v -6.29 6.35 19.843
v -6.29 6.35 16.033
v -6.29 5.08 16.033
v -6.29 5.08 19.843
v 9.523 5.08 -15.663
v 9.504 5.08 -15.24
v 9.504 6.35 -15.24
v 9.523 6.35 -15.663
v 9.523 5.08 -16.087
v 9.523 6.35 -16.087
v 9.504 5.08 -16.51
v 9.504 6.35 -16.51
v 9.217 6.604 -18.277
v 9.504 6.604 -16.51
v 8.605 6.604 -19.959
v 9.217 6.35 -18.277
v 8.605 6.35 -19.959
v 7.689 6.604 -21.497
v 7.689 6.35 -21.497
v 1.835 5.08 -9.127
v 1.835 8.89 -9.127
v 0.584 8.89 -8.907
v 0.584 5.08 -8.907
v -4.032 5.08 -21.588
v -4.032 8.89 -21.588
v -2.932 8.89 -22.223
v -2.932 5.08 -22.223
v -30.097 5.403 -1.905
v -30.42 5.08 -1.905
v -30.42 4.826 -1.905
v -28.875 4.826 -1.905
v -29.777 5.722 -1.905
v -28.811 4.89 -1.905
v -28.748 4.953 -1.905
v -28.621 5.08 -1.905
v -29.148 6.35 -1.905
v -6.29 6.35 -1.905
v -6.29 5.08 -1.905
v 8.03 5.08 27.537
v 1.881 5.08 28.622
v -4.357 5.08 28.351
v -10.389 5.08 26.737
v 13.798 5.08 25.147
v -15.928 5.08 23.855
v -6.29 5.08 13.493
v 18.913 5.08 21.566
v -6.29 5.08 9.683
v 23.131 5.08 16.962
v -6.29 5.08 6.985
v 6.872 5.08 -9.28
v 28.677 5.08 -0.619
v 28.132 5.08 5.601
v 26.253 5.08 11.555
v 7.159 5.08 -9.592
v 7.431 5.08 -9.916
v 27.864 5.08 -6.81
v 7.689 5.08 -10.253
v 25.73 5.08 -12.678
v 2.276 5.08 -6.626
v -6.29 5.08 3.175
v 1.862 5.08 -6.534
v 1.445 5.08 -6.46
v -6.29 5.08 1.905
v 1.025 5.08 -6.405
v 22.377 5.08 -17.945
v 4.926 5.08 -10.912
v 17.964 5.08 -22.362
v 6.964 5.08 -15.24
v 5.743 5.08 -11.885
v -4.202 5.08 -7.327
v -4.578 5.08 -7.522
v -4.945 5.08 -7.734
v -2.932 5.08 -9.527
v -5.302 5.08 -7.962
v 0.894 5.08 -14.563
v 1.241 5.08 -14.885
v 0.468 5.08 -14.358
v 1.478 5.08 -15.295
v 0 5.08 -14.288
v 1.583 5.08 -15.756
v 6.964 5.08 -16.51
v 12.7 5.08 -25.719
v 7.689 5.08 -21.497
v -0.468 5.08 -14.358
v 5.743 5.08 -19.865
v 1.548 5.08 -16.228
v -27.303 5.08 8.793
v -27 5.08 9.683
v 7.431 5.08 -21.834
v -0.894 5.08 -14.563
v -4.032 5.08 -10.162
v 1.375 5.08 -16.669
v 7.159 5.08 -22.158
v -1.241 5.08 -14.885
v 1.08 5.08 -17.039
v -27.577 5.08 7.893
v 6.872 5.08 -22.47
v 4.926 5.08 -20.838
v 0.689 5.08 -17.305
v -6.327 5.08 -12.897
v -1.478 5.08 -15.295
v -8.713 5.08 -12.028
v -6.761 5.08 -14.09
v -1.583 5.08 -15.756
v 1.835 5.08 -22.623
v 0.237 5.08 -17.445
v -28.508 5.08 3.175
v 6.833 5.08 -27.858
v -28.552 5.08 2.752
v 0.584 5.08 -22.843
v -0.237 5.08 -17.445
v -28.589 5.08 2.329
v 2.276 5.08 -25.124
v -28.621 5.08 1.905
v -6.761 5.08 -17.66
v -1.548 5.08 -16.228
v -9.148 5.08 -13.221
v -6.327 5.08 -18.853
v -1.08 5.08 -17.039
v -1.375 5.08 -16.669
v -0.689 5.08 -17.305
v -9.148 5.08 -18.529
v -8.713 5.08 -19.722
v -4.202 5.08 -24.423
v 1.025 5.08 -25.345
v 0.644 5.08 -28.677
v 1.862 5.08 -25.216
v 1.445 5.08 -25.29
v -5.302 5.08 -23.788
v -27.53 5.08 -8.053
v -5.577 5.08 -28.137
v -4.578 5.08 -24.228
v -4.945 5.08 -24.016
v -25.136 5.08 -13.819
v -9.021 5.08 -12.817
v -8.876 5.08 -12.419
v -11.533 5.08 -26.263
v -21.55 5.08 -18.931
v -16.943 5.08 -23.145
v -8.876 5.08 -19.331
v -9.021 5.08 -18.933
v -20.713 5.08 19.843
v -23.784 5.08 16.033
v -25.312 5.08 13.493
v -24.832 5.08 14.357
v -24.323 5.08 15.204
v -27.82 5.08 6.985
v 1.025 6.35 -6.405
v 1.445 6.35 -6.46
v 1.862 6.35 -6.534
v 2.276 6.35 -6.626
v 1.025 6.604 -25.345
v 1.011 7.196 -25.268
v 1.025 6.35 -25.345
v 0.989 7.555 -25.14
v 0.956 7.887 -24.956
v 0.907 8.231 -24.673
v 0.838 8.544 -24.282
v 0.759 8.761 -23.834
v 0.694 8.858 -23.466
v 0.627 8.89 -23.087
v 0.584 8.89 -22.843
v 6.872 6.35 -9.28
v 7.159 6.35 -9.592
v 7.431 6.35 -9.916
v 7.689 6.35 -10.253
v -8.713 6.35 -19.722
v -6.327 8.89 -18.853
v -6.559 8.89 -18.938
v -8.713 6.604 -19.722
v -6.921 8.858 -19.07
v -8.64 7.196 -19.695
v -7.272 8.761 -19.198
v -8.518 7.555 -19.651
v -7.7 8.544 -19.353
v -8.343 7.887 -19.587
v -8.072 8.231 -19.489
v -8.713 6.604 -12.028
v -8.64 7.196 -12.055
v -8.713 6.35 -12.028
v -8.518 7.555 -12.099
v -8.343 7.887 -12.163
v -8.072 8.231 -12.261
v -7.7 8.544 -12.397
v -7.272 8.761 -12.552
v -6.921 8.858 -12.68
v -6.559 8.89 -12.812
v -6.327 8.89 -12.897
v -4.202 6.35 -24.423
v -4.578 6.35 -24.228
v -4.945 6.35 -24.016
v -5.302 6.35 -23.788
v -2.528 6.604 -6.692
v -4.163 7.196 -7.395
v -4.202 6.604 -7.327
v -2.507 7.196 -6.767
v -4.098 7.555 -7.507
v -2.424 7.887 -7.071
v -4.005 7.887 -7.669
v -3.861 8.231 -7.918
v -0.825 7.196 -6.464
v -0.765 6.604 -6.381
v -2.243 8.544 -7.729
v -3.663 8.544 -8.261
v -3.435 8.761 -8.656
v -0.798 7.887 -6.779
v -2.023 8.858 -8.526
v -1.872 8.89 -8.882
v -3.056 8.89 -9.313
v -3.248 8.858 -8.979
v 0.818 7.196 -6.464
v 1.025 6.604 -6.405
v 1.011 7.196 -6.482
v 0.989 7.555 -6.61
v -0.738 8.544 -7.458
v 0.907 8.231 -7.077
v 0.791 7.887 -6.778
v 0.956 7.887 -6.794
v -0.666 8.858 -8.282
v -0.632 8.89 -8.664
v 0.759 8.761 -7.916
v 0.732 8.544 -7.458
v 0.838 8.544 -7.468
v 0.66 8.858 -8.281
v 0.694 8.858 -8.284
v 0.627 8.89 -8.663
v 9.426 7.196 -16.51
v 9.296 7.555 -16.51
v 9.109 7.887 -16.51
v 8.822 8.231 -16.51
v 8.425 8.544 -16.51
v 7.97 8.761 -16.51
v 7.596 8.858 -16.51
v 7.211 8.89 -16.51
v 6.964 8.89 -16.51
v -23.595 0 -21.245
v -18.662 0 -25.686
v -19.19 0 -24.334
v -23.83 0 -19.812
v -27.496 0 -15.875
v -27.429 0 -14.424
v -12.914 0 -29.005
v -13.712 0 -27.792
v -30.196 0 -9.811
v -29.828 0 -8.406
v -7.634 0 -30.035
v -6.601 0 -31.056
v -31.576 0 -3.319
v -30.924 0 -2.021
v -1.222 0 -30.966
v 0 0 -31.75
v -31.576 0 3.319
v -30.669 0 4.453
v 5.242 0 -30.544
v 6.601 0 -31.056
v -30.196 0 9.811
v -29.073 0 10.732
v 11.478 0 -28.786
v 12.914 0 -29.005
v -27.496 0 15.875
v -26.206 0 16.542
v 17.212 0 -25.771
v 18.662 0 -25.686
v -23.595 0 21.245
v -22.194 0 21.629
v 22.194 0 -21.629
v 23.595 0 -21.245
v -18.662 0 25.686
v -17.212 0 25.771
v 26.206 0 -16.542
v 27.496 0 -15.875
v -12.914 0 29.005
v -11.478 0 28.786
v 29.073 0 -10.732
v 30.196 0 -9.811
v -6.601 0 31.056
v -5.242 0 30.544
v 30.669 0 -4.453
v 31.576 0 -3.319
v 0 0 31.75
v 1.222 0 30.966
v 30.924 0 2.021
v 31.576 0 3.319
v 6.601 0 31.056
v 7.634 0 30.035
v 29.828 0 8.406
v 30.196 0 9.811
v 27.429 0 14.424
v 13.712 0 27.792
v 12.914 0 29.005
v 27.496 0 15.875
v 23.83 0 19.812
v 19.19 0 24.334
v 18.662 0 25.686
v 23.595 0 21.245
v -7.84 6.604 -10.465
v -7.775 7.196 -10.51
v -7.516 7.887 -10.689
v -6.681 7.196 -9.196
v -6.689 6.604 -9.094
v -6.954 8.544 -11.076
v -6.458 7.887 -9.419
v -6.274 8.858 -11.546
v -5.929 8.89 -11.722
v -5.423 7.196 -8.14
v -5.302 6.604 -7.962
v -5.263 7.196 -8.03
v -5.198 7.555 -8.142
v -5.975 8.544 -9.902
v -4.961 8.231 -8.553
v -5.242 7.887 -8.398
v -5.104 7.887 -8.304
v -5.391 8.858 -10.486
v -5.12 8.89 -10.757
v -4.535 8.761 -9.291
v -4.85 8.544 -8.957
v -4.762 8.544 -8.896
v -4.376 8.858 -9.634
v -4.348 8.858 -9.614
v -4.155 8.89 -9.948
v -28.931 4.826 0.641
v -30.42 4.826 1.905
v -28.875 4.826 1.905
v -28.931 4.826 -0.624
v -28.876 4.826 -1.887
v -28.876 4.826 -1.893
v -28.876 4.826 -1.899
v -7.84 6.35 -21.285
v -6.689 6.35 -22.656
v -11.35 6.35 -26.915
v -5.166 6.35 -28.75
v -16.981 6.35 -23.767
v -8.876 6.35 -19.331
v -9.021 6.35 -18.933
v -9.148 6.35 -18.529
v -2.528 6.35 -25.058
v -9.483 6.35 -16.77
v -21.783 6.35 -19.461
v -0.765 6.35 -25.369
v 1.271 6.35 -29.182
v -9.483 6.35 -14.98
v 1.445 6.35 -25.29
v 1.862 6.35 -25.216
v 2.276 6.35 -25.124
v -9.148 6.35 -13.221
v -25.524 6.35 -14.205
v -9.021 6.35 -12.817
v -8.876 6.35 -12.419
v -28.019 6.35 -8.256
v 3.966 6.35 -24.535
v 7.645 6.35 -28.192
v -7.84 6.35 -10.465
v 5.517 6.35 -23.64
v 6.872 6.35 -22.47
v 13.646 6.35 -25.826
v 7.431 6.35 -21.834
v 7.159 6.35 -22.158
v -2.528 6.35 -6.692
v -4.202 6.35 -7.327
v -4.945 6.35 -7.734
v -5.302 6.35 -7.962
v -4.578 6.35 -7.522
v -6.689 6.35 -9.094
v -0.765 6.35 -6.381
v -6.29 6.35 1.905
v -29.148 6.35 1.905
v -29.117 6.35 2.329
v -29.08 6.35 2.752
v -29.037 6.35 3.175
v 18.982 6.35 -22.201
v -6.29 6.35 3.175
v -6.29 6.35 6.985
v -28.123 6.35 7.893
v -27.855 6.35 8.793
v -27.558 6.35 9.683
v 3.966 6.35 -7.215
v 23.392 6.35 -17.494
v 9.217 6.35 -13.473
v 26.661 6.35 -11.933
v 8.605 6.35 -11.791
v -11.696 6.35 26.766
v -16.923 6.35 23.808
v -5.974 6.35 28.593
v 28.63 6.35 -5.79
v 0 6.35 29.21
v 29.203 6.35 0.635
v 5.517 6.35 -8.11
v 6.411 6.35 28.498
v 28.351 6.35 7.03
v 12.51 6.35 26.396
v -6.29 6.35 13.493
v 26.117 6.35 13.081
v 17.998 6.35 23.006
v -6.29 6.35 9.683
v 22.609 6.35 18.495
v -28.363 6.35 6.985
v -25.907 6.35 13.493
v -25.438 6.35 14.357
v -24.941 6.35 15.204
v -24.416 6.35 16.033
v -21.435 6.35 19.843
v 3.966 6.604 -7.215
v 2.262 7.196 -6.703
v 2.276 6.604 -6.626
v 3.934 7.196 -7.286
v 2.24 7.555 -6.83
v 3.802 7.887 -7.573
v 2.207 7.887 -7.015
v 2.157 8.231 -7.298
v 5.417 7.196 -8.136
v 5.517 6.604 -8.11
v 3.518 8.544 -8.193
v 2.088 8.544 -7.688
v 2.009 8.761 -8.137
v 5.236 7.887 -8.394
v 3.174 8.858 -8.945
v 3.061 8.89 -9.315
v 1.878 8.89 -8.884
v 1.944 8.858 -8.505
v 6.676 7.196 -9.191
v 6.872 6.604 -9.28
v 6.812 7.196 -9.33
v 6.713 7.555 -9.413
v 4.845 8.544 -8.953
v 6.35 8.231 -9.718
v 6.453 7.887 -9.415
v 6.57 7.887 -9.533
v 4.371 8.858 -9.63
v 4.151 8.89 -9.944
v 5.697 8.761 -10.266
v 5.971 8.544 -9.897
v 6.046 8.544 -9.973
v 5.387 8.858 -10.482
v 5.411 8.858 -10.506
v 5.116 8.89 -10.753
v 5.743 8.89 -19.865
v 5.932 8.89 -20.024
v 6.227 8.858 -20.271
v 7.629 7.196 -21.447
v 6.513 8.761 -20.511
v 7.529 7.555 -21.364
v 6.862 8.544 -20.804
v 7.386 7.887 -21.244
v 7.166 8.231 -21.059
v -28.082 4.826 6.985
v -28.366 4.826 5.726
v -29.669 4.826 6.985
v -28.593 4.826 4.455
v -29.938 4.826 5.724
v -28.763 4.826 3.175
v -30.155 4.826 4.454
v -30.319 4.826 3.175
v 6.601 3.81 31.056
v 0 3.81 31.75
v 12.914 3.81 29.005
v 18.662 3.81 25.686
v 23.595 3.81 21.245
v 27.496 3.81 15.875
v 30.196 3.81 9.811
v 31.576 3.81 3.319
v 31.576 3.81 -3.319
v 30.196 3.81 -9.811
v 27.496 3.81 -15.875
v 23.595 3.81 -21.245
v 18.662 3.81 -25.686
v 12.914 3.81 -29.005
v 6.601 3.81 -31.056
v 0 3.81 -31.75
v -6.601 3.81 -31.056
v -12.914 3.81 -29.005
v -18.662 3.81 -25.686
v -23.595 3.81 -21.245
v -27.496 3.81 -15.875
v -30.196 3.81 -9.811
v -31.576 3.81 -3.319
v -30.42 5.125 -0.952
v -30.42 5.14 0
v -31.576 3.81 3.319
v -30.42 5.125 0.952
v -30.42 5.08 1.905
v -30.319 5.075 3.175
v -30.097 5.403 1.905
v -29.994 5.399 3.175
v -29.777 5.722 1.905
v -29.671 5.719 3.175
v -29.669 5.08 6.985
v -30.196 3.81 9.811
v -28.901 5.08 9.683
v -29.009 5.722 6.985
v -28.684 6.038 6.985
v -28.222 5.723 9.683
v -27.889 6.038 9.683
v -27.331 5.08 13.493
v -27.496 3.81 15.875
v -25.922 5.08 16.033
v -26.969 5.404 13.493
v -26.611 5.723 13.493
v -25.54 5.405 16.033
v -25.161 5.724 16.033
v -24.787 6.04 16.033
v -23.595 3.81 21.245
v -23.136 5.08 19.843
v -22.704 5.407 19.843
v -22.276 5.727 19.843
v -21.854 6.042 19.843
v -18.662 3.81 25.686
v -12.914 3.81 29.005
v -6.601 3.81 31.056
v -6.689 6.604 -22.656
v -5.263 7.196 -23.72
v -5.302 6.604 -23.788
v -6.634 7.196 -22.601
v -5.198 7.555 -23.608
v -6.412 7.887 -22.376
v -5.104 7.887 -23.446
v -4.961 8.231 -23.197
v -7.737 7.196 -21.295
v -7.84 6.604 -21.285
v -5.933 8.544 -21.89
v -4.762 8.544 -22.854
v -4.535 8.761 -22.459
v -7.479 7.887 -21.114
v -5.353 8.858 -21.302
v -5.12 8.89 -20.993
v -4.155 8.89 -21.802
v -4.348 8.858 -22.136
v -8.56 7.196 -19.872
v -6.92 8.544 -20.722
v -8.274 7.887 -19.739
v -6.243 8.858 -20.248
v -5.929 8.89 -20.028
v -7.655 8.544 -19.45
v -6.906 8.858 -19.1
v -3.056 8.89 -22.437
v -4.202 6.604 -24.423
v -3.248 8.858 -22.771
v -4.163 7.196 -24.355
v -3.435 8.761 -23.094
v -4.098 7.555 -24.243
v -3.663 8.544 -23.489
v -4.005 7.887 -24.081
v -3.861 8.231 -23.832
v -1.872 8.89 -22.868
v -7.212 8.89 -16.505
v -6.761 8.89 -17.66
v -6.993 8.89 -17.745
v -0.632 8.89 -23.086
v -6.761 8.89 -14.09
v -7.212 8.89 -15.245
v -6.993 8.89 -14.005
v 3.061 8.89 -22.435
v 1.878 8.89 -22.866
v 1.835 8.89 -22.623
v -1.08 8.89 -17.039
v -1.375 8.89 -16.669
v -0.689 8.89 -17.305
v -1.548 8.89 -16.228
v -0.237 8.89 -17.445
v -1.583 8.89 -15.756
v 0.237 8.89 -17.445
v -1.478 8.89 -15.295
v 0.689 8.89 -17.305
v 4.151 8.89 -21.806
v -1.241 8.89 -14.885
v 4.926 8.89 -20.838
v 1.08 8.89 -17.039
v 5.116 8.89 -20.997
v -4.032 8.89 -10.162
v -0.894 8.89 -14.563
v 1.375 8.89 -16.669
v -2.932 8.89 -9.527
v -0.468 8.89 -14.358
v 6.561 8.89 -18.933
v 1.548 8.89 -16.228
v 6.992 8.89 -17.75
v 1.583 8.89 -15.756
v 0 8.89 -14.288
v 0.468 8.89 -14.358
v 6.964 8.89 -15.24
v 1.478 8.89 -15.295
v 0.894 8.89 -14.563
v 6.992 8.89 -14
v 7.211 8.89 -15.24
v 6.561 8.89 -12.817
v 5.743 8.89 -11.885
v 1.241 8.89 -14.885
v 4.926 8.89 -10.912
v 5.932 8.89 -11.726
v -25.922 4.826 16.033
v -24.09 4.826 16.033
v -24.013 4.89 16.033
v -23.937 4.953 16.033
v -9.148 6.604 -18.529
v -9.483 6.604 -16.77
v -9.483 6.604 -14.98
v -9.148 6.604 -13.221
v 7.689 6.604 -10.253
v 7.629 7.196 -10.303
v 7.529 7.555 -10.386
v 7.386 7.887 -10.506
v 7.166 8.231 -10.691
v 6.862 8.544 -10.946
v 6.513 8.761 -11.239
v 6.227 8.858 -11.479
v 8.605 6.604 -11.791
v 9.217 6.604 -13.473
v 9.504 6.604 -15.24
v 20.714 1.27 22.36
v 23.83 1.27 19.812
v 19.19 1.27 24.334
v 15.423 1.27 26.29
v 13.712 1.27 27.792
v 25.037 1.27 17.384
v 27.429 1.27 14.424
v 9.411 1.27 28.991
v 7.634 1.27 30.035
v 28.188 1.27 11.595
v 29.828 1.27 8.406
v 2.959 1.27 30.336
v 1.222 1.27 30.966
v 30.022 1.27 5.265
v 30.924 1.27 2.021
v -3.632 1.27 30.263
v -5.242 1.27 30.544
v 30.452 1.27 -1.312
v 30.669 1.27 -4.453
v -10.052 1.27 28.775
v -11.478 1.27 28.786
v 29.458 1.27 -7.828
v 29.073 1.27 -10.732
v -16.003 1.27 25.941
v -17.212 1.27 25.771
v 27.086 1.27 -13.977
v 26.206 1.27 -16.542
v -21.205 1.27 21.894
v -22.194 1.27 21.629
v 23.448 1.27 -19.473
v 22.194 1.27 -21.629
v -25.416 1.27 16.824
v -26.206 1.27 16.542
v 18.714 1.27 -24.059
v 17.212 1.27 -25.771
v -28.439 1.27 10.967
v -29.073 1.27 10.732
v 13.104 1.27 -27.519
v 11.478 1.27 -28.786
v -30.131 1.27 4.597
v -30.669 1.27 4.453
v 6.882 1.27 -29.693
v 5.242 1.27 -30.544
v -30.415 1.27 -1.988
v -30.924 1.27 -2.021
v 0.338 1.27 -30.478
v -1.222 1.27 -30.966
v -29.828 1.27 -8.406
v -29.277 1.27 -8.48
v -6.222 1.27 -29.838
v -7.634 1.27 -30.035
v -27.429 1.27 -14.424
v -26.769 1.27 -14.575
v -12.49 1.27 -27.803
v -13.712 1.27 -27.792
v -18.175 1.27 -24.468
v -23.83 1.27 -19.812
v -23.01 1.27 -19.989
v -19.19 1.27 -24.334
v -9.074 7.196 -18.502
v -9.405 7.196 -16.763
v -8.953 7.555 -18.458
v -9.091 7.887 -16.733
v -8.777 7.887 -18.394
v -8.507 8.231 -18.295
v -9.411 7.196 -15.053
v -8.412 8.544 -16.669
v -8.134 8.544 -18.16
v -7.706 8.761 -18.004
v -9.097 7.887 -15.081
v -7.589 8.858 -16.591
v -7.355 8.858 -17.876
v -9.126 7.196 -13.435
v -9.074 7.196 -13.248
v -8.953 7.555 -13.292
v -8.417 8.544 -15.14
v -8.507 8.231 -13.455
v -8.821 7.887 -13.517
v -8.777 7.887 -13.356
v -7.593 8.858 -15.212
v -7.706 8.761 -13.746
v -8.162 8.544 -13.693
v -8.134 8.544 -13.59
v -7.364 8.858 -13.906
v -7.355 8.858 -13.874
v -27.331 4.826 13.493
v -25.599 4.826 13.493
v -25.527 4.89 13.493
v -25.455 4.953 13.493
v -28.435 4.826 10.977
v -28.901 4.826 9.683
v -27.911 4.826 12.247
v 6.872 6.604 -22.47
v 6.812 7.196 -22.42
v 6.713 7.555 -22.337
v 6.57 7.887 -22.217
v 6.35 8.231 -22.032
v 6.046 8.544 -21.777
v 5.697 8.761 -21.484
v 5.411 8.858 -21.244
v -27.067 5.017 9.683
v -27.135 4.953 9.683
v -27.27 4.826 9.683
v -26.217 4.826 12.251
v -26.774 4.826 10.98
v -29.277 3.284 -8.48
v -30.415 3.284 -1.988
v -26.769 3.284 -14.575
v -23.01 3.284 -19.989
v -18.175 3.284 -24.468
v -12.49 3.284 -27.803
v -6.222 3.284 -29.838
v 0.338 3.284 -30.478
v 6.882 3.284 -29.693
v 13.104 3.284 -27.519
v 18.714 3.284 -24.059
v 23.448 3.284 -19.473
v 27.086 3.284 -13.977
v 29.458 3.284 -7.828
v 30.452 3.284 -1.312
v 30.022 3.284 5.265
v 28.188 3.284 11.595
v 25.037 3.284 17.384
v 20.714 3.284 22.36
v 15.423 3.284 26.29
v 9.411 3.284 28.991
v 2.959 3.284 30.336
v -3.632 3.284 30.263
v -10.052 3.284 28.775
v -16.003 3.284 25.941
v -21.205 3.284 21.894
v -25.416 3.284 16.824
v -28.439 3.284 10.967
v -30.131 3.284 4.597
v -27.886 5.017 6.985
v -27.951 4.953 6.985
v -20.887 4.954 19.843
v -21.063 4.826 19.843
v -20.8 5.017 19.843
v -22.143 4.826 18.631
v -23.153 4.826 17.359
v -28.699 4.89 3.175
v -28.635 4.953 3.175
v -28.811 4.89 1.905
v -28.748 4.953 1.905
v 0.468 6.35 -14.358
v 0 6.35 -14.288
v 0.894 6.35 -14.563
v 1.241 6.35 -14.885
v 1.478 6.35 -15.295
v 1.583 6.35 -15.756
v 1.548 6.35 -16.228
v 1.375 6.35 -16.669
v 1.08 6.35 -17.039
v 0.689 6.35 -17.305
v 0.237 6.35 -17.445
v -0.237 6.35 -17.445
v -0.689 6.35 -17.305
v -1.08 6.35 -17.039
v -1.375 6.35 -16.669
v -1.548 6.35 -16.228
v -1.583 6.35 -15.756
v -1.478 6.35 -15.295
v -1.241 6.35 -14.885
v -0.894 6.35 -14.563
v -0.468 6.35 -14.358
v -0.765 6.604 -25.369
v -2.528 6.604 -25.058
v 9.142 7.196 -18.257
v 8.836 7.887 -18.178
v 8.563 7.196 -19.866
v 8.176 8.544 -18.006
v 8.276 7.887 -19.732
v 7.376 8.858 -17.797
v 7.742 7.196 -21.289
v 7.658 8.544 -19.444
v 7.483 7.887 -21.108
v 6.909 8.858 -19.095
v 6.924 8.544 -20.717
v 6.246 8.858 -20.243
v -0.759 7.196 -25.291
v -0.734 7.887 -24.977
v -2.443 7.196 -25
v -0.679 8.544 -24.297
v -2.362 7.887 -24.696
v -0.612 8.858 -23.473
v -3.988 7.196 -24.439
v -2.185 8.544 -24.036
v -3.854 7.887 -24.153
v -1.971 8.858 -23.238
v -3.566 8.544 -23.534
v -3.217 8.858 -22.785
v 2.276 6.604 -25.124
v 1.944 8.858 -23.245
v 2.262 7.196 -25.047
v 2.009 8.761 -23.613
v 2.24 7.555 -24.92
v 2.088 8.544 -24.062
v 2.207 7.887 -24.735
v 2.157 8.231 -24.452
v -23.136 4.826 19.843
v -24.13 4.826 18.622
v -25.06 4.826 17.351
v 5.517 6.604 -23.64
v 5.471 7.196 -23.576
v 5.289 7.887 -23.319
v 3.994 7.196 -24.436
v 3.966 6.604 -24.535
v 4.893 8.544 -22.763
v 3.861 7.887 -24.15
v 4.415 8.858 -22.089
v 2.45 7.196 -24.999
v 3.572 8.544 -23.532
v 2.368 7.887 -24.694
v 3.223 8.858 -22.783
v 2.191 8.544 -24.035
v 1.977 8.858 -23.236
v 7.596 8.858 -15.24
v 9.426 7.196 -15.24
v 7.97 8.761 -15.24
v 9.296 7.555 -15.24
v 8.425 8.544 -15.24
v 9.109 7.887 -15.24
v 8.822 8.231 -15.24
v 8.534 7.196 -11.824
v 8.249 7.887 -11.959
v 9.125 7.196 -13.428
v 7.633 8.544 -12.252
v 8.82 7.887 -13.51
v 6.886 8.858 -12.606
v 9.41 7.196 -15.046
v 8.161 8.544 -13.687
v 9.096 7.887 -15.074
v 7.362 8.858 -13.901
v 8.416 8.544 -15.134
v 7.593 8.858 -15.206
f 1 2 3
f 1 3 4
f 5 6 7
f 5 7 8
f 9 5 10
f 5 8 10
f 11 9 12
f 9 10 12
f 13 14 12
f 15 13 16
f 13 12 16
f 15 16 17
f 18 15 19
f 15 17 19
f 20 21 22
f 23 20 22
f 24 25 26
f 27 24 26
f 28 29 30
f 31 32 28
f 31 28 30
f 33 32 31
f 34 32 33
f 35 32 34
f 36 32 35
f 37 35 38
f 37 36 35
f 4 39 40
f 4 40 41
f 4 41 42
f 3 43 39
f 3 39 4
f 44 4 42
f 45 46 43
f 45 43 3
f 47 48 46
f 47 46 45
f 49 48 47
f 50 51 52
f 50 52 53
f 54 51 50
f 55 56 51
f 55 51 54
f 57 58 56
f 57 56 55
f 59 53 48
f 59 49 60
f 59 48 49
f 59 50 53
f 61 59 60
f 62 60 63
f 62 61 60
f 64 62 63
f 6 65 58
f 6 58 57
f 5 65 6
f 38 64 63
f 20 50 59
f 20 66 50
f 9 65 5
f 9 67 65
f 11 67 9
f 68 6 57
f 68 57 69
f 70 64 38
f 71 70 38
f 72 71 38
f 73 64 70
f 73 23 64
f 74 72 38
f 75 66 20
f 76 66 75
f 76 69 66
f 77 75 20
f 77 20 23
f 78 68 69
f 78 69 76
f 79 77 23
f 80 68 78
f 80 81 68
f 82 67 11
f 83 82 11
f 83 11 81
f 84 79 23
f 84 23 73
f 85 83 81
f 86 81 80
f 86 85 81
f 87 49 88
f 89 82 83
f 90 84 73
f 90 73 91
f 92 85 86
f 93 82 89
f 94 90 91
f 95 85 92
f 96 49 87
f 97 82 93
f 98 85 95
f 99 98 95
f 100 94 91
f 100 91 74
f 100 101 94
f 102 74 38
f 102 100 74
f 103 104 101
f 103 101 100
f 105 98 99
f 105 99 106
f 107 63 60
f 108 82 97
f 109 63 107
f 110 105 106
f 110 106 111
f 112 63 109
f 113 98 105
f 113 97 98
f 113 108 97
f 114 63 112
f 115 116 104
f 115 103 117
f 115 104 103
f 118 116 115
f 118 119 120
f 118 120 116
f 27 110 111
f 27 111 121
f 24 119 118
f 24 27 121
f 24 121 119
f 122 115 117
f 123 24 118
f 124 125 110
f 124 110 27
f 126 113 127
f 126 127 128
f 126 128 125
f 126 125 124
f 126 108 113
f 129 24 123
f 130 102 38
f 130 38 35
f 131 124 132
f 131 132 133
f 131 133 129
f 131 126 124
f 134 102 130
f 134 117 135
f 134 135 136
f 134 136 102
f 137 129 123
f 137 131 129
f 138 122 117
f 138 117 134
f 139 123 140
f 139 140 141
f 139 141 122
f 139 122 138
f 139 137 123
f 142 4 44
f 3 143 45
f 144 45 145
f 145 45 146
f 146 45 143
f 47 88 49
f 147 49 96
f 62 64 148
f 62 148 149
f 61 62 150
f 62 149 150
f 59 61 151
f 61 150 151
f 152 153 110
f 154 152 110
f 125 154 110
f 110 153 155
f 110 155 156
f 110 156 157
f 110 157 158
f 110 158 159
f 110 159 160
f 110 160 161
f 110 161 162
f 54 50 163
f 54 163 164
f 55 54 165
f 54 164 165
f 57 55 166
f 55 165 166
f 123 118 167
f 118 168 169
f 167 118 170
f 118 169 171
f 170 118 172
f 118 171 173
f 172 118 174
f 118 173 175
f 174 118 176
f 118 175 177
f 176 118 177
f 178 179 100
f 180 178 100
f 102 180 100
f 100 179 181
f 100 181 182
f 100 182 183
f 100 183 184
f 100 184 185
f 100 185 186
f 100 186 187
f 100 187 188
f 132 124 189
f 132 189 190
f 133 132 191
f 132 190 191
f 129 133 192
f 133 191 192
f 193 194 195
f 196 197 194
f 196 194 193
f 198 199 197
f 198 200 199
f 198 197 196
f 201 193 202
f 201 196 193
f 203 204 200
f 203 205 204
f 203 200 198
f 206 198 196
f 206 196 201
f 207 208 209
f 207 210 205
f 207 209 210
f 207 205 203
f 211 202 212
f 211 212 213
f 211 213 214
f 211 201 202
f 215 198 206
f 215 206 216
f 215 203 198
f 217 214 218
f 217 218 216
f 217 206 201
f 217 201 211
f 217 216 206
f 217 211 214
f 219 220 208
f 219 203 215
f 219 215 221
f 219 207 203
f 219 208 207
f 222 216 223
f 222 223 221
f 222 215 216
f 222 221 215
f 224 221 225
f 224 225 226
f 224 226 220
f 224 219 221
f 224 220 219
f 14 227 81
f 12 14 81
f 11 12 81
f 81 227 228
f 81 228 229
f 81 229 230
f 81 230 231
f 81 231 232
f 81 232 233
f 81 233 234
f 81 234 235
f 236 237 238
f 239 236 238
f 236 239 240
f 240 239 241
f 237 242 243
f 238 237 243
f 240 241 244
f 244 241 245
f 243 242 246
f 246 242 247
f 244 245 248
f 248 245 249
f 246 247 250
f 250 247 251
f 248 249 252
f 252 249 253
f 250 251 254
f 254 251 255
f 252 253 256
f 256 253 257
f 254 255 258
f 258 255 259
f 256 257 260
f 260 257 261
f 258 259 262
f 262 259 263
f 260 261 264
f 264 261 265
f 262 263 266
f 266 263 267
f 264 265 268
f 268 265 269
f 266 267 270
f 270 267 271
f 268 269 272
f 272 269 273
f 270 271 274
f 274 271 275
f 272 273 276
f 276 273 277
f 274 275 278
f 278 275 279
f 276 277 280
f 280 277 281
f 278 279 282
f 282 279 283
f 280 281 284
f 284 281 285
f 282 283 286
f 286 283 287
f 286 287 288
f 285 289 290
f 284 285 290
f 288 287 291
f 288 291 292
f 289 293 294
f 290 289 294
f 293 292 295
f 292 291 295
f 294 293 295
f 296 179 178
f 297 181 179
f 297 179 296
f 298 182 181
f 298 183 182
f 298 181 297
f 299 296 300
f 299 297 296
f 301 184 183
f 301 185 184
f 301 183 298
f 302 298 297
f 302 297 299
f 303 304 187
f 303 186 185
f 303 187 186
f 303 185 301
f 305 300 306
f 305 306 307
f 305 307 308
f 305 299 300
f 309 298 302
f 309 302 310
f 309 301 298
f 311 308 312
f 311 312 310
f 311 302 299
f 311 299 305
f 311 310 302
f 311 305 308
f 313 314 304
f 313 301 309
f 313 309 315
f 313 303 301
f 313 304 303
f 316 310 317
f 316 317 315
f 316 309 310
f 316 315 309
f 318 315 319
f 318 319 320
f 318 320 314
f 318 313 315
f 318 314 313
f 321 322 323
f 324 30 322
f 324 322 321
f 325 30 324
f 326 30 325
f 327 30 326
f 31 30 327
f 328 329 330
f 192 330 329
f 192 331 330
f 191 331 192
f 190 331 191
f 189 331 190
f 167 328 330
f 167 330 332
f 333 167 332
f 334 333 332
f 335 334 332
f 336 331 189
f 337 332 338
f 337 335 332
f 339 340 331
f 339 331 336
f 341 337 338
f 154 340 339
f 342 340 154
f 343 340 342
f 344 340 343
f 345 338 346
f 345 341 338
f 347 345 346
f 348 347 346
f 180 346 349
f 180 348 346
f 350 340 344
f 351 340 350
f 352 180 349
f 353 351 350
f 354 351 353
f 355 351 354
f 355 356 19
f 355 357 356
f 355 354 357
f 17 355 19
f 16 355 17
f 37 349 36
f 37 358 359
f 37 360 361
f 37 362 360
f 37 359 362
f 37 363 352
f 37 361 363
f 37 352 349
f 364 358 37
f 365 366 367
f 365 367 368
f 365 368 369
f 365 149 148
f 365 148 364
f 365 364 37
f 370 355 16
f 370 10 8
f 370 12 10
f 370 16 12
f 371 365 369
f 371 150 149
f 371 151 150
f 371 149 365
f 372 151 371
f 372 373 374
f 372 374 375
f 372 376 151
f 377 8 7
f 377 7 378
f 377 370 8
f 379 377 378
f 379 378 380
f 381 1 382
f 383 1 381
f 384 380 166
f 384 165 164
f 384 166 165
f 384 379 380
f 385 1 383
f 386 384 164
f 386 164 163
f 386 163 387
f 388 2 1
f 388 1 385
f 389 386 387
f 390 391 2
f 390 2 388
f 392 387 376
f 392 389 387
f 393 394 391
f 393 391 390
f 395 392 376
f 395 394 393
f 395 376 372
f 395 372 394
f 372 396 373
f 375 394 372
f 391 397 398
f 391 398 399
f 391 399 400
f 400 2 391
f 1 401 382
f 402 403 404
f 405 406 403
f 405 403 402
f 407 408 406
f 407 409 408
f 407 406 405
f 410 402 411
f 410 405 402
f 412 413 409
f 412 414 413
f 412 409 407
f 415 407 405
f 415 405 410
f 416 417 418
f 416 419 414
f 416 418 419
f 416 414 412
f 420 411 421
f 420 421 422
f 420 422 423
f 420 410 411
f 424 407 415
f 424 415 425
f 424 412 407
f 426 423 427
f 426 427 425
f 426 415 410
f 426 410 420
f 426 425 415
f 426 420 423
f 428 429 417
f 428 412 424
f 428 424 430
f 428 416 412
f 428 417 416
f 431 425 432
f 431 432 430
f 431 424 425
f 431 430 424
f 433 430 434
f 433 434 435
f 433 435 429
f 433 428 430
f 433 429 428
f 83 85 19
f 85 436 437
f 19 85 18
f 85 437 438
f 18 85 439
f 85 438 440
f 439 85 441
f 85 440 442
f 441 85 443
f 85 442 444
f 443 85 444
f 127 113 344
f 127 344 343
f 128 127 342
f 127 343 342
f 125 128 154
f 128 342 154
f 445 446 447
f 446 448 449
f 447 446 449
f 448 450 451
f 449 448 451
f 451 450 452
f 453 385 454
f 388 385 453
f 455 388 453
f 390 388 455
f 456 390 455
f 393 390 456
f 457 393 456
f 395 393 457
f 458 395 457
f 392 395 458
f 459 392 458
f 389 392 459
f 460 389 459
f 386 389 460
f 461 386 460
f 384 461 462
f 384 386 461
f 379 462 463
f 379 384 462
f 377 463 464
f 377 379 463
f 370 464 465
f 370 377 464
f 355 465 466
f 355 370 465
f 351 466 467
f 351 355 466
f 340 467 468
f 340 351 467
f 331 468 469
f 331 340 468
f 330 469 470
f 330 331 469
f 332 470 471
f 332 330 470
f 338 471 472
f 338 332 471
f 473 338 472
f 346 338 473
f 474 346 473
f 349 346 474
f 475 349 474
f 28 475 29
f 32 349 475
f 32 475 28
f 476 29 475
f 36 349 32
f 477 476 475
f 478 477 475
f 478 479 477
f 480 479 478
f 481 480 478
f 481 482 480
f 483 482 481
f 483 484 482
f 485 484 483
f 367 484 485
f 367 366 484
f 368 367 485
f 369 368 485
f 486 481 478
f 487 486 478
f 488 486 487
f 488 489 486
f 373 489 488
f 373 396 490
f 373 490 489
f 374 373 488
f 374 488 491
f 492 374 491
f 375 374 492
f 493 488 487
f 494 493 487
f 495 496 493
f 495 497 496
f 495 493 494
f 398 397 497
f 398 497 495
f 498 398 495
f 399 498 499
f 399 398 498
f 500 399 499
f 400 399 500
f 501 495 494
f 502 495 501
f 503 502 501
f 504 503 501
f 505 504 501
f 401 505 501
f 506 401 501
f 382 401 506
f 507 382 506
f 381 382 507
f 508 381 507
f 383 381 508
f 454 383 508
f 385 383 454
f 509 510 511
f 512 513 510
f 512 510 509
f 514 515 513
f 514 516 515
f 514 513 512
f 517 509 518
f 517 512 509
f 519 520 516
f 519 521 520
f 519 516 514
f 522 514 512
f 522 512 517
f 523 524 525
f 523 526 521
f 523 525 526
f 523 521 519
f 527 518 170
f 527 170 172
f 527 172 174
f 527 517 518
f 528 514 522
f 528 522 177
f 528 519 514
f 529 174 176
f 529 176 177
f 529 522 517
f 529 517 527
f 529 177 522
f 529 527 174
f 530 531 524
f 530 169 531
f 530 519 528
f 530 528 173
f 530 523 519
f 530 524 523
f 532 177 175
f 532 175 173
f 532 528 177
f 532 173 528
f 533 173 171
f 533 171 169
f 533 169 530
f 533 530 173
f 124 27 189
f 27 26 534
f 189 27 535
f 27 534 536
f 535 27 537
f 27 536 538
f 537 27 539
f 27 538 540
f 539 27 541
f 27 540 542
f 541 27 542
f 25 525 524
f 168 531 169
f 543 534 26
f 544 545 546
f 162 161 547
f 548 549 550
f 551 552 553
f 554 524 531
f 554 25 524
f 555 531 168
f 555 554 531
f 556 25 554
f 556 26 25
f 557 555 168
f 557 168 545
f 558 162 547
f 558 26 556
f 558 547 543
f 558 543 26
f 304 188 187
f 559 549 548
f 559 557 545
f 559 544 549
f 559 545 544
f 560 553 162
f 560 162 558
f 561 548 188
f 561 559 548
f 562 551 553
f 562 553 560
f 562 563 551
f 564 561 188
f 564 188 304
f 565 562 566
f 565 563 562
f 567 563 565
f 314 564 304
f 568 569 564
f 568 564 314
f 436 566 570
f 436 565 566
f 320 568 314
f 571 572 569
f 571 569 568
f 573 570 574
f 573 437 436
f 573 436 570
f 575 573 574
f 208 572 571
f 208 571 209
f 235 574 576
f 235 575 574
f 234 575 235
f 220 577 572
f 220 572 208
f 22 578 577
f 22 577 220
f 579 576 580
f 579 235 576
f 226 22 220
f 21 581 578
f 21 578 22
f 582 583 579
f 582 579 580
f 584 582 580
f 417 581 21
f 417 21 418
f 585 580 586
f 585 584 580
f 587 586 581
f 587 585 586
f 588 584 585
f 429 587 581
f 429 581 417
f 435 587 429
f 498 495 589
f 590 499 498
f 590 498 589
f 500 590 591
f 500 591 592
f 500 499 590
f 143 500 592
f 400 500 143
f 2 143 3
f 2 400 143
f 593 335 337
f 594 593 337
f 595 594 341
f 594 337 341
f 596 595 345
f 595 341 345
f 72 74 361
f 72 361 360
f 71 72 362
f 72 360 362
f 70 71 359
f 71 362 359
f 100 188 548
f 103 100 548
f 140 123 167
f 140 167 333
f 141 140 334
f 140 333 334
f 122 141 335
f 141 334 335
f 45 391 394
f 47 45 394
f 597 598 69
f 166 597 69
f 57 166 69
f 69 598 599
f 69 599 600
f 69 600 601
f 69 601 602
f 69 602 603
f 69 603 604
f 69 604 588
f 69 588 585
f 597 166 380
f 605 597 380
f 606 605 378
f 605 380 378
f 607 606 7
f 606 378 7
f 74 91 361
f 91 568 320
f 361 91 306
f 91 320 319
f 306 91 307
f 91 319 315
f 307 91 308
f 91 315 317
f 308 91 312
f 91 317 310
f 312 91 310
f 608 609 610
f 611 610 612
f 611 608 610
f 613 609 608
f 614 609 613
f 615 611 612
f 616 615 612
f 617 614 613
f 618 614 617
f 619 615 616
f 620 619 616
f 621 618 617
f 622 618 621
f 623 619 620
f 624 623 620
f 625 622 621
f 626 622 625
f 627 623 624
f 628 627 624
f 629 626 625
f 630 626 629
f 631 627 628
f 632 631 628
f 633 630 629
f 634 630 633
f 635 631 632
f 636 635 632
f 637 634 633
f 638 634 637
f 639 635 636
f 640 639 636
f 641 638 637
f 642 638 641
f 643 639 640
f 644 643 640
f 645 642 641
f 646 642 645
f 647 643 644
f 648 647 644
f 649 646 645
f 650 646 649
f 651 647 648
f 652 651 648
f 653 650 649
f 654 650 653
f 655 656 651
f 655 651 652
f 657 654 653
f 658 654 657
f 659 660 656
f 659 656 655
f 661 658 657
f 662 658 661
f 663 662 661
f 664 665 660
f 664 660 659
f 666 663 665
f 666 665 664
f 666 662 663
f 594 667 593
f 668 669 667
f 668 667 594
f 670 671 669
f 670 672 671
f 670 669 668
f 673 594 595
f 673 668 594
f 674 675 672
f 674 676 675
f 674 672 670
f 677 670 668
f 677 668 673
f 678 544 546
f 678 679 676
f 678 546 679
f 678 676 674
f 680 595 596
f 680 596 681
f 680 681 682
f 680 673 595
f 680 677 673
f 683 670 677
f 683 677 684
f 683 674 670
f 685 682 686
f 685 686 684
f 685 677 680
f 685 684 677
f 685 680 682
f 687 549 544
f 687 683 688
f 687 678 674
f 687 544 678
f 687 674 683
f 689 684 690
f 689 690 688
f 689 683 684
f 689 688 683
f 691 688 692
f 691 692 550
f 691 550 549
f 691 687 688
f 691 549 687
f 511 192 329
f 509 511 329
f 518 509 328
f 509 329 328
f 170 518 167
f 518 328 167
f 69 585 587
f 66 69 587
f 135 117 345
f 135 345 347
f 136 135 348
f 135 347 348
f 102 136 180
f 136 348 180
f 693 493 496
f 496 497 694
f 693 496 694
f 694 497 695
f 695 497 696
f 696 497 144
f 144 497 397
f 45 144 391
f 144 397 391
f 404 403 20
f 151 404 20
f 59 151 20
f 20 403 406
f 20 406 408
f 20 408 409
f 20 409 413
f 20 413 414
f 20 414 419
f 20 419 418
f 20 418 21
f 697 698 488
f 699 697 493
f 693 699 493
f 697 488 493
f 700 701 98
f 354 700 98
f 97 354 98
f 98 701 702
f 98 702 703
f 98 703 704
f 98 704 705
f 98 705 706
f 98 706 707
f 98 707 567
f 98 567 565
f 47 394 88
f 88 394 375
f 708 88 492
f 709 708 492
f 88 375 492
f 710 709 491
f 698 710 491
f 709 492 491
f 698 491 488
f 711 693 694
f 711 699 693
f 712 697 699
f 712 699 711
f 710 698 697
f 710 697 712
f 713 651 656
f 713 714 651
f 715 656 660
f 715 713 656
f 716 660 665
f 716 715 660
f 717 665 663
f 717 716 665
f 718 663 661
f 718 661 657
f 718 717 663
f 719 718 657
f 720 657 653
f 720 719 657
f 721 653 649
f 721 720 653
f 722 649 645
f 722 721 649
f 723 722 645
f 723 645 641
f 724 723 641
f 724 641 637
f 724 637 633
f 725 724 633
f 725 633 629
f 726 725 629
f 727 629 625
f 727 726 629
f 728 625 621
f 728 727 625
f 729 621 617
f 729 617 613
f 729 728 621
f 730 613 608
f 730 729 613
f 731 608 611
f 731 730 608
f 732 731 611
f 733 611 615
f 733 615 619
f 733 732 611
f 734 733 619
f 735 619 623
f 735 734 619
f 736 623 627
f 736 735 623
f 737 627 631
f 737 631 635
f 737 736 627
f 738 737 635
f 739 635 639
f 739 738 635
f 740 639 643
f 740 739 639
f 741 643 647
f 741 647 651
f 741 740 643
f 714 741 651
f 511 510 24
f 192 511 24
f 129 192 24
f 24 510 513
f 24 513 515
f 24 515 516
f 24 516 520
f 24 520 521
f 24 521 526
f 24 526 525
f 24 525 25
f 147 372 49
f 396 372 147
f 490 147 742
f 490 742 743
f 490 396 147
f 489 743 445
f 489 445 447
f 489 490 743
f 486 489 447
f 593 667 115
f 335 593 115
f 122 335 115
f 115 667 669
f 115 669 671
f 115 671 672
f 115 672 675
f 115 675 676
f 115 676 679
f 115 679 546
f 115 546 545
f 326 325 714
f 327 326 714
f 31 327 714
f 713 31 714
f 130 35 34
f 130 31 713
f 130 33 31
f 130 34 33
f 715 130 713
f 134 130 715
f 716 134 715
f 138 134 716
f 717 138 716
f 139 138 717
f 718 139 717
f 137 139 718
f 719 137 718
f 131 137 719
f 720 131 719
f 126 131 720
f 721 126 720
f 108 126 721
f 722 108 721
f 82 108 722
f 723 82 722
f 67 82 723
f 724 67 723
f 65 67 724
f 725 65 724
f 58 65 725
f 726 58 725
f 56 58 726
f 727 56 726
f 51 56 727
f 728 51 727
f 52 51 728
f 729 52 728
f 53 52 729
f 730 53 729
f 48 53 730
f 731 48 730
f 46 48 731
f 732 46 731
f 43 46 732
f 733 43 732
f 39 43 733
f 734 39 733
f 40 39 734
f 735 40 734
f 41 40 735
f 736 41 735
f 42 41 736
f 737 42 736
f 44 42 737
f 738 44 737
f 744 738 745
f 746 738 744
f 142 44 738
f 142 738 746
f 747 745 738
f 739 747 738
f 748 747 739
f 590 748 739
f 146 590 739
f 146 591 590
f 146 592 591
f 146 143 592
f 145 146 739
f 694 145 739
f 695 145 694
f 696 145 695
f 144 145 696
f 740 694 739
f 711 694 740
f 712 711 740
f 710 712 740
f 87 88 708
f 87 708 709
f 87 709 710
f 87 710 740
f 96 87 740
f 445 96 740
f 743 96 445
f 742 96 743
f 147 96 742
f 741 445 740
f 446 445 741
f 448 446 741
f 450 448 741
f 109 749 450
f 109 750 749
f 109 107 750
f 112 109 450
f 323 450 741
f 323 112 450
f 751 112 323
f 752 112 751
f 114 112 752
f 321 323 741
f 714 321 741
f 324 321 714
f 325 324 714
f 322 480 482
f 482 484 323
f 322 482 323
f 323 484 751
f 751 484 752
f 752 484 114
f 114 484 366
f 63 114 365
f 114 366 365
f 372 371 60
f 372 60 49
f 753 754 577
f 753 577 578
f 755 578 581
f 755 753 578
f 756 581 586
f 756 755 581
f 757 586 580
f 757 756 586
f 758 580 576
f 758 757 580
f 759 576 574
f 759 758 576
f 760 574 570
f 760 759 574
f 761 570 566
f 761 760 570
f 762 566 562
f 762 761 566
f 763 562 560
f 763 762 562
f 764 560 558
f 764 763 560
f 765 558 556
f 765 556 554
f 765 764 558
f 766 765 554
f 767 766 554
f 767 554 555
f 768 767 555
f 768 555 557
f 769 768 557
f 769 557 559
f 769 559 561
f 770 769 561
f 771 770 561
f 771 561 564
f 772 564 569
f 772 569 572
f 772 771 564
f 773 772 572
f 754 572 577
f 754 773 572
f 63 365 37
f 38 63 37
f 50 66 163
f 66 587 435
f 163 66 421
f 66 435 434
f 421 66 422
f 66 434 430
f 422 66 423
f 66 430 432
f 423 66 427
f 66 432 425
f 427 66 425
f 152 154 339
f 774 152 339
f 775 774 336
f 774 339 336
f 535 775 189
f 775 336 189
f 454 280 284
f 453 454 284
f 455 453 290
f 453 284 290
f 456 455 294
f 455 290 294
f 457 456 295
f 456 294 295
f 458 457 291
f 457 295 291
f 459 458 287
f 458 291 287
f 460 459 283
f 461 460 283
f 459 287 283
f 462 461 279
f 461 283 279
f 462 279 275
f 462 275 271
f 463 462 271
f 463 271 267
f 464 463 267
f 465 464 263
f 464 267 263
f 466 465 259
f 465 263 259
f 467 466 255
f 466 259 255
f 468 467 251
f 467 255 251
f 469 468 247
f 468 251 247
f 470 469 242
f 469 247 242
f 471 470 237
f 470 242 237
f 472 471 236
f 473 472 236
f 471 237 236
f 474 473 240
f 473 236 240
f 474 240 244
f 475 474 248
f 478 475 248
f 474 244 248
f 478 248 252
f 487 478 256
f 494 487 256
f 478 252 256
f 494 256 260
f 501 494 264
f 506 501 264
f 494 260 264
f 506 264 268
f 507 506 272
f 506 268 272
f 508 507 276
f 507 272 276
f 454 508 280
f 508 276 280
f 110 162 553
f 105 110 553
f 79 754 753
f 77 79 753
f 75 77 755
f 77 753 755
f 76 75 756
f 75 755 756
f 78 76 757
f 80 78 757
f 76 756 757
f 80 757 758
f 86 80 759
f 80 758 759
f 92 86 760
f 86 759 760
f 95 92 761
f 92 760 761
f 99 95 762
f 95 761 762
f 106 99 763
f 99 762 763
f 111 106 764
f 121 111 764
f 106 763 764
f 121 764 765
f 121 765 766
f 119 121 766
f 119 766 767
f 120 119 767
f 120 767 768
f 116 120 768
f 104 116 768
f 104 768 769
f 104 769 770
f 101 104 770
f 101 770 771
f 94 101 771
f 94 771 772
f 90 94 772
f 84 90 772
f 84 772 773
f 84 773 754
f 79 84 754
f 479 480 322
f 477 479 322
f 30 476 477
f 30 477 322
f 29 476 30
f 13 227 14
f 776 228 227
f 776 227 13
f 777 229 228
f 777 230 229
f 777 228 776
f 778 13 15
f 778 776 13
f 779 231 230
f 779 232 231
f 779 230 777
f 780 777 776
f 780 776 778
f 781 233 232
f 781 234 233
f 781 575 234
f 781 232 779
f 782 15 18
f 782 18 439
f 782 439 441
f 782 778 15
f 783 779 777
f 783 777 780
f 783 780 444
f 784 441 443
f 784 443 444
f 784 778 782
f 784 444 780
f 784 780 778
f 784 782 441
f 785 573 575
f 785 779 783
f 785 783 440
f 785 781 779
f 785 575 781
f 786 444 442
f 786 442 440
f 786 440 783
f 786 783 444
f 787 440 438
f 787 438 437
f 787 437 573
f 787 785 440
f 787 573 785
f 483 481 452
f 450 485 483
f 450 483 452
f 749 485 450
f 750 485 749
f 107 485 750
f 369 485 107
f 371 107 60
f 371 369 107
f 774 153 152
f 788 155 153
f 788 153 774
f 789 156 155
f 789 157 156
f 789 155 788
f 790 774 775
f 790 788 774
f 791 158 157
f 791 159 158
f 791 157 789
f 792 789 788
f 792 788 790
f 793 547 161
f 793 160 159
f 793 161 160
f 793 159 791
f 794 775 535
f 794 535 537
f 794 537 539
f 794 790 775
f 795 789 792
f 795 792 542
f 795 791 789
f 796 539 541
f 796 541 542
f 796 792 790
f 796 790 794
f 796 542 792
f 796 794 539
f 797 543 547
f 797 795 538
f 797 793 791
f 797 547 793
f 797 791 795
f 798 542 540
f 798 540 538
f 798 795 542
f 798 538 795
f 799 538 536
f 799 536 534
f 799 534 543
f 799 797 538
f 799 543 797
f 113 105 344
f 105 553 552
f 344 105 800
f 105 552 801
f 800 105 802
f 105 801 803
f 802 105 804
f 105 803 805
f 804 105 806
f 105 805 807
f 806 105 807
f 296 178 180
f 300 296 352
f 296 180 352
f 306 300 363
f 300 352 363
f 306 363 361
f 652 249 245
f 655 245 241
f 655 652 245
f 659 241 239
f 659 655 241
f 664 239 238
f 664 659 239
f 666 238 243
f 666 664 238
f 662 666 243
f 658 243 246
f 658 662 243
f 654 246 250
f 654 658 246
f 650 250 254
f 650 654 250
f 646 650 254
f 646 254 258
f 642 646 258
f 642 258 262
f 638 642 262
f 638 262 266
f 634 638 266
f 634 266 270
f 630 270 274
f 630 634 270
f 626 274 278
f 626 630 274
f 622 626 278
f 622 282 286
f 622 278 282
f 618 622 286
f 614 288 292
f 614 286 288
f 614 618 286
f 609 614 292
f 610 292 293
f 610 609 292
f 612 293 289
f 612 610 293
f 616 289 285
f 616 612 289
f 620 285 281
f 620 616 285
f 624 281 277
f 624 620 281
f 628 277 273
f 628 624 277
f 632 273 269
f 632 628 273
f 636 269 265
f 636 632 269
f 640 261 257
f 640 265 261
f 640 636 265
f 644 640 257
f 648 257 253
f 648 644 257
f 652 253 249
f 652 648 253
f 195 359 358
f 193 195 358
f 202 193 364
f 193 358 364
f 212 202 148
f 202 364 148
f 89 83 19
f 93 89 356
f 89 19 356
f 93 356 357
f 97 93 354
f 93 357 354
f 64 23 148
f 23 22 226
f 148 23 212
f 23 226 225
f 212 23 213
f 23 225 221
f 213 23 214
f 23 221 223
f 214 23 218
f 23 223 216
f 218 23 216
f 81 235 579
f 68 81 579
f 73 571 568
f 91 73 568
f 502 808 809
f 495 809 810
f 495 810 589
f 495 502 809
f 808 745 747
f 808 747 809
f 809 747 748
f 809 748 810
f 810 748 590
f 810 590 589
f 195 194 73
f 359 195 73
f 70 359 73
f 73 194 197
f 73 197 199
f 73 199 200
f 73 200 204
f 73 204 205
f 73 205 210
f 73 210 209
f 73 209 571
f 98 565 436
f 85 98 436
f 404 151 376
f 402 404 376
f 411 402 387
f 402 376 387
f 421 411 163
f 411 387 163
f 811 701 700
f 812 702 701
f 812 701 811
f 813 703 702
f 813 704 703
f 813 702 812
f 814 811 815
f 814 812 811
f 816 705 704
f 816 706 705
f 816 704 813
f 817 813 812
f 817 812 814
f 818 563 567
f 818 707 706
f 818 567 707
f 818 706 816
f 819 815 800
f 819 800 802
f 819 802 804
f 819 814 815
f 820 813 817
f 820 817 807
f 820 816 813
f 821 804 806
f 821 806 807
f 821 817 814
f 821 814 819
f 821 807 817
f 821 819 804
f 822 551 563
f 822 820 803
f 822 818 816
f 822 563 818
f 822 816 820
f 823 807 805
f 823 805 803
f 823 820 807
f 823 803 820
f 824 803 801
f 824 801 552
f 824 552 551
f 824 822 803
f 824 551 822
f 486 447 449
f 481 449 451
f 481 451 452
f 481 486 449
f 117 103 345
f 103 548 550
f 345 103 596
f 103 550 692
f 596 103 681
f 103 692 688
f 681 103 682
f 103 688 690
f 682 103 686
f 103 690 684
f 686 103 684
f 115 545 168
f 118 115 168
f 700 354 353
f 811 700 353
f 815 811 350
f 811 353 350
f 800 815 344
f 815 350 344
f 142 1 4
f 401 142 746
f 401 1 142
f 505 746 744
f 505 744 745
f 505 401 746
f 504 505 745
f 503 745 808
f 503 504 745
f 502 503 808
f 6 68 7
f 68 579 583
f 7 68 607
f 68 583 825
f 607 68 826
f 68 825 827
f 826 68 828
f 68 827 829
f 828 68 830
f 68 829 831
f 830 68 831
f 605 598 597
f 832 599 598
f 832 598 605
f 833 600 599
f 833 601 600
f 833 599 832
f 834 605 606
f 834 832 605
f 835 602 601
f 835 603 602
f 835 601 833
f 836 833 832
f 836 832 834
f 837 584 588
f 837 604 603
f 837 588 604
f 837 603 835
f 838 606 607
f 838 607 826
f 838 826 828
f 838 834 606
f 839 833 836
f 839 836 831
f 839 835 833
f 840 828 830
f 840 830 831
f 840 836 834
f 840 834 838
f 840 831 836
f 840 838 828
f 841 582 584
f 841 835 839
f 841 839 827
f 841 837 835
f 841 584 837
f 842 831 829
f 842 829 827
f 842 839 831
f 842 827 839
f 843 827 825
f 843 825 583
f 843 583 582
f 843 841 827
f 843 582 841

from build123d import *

# Parameters (mm, degrees)
SKETCH1_R           = 31.75
BOSS_EXTRUDE1_DEPTH = 6.35
CHAMFER2_SIZE       = 2.54
SKETCH2_R           = 9.525
SKETCH2_R_2         = 1.5875
BOSS_EXTRUDE2_DEPTH = 2.54
SKETCH2_2_R         = 1.5875
CUT_EXTRUDE1_DEPTH  = 46.348070521
FILLET1_R           = 2.286
CUT_EXTRUDE4_DEPTH  = 46.772886079
CIRPATTERN1_COUNT   = 9
SKETCH5_W           = 24.13
SKETCH5_H           = 3.81
CUT_EXTRUDE5_DEPTH  = 1.524


with BuildPart() as part:
    # Sketch1 → Boss-Extrude1 (new body)
    with BuildSketch(Plane(origin=(0, 0, 0), x_dir=(1, 0, 0), z_dir=(0, 1, 0))):
        Circle(SKETCH1_R)
    extrude(amount=BOSS_EXTRUDE1_DEPTH)

    # Chamfer2
    chamfer2_edges = [part.edges().sort_by_distance(p)[0] for p in [
        (-31.75, 6.35, 0),
    ]]
    chamfer(chamfer2_edges, length=CHAMFER2_SIZE)

    # Sketch2 → Boss-Extrude2 (add)
    with BuildSketch(Plane(origin=(0, 6.35, 0), x_dir=(1, 0, 0), z_dir=(0, 1, 0))):
        with Locations((0, 15.875)):
            Circle(SKETCH2_R)
        with Locations((0, 15.875)):
            Circle(SKETCH2_R_2, mode=Mode.SUBTRACT)
    extrude(amount=BOSS_EXTRUDE2_DEPTH)

    # Sketch2<2> → Cut-Extrude1 (cut, through all)
    with BuildSketch(Plane(origin=(0, 6.35, 0), x_dir=(1, 0, 0), z_dir=(0, 1, 0))):
        with Locations((0, 15.875)):
            Circle(SKETCH2_2_R)
    extrude(amount=-CUT_EXTRUDE1_DEPTH, mode=Mode.SUBTRACT)

    # Fillet1
    fillet1_edges = [part.edges().sort_by_distance(p)[0] for p in [
        (-9.525, 8.89, -15.875),
    ]]
    fillet(fillet1_edges, radius=FILLET1_R)

    # Sketch4 → Cut-Extrude4 (cut, through all)
    with BuildSketch(Plane(origin=(0, 8.89, 0), x_dir=(1, 0, 0), z_dir=(0, 1, 0))):
        with BuildLine():
            Line((9.503809762, 16.51), (6.963809762, 16.51))
            Line((6.963809762, 16.51), (6.963809762, 15.24))
            Line((6.963809762, 15.24), (9.503809762, 15.24))
            ThreePointArc((9.503809762, 15.24), (9.525, 15.875), (9.503809762, 16.51))
        make_face()
    cut_extrude4 = extrude(amount=-CUT_EXTRUDE4_DEPTH, mode=Mode.SUBTRACT)

    # CirPattern1: Cut-Extrude4 ×9 about axis
    cirpattern1_axis = Axis((0, 8.89, -15.875), (0, 1, 0))
    for i in range(1, CIRPATTERN1_COUNT):
        add(cut_extrude4.rotate(cirpattern1_axis, i * 360 / CIRPATTERN1_COUNT), mode=Mode.SUBTRACT)

    # Sketch5 → Cut-Extrude5 (cut)
    with BuildSketch(Plane(origin=(0, 6.35, 0), x_dir=(1, 0, 0), z_dir=(0, 1, 0))):
        with Locations((-18.3554105, 0)):
            Rectangle(SKETCH5_W, SKETCH5_H)
        with BuildLine():
            Line((-6.2904105, -3.175), (-6.2904105, -6.985))
            Line((-6.2904105, -6.985), (-29.668841821, -6.985))
            ThreePointArc((-29.668841821, -6.985), (-30.053265488, -5.090106258), (-30.319295317, -3.175))
            Line((-30.319295317, -3.175), (-6.2904105, -3.175))
        make_face()
        with BuildLine():
            Line((-6.2904105, -13.493377405), (-6.2904105, -9.683377405))
            Line((-6.2904105, -9.683377405), (-28.900910055, -9.683377405))
            ThreePointArc((-28.900910055, -9.683377405), (-28.18019525, -11.614947079), (-27.330553712, -13.493377405))
            Line((-27.330553712, -13.493377405), (-6.2904105, -13.493377405))
        make_face()
        with BuildLine():
            Line((-6.2904105, -16.033377405), (-6.2904105, -19.843377405))
            Line((-6.2904105, -19.843377405), (-23.135919544, -19.843377405))
            ThreePointArc((-23.135919544, -19.843377405), (-24.602929827, -17.992394058), (-25.922214585, -16.033377405))
            Line((-25.922214585, -16.033377405), (-6.2904105, -16.033377405))
        make_face()
    extrude(amount=-CUT_EXTRUDE5_DEPTH, mode=Mode.SUBTRACT)

    # Sketch6 → Cut-Revolve1 (revolve, cut)
    with BuildSketch(Plane(origin=(0, 0, 0), x_dir=(0, 0, -1), z_dir=(1, 0, 0))):
        Polygon((-30.48, 3.283948776), (-28.683948776, 5.08), (0, 5.08), (0, -0.561099899), (-30.990180808, -0.561099899), (-30.990180808, 1.27), (-30.48, 1.27), align=None)
    revolve(axis=Axis((0, 0, 0), (0, -1, 0)), mode=Mode.SUBTRACT)


solid = part.part
